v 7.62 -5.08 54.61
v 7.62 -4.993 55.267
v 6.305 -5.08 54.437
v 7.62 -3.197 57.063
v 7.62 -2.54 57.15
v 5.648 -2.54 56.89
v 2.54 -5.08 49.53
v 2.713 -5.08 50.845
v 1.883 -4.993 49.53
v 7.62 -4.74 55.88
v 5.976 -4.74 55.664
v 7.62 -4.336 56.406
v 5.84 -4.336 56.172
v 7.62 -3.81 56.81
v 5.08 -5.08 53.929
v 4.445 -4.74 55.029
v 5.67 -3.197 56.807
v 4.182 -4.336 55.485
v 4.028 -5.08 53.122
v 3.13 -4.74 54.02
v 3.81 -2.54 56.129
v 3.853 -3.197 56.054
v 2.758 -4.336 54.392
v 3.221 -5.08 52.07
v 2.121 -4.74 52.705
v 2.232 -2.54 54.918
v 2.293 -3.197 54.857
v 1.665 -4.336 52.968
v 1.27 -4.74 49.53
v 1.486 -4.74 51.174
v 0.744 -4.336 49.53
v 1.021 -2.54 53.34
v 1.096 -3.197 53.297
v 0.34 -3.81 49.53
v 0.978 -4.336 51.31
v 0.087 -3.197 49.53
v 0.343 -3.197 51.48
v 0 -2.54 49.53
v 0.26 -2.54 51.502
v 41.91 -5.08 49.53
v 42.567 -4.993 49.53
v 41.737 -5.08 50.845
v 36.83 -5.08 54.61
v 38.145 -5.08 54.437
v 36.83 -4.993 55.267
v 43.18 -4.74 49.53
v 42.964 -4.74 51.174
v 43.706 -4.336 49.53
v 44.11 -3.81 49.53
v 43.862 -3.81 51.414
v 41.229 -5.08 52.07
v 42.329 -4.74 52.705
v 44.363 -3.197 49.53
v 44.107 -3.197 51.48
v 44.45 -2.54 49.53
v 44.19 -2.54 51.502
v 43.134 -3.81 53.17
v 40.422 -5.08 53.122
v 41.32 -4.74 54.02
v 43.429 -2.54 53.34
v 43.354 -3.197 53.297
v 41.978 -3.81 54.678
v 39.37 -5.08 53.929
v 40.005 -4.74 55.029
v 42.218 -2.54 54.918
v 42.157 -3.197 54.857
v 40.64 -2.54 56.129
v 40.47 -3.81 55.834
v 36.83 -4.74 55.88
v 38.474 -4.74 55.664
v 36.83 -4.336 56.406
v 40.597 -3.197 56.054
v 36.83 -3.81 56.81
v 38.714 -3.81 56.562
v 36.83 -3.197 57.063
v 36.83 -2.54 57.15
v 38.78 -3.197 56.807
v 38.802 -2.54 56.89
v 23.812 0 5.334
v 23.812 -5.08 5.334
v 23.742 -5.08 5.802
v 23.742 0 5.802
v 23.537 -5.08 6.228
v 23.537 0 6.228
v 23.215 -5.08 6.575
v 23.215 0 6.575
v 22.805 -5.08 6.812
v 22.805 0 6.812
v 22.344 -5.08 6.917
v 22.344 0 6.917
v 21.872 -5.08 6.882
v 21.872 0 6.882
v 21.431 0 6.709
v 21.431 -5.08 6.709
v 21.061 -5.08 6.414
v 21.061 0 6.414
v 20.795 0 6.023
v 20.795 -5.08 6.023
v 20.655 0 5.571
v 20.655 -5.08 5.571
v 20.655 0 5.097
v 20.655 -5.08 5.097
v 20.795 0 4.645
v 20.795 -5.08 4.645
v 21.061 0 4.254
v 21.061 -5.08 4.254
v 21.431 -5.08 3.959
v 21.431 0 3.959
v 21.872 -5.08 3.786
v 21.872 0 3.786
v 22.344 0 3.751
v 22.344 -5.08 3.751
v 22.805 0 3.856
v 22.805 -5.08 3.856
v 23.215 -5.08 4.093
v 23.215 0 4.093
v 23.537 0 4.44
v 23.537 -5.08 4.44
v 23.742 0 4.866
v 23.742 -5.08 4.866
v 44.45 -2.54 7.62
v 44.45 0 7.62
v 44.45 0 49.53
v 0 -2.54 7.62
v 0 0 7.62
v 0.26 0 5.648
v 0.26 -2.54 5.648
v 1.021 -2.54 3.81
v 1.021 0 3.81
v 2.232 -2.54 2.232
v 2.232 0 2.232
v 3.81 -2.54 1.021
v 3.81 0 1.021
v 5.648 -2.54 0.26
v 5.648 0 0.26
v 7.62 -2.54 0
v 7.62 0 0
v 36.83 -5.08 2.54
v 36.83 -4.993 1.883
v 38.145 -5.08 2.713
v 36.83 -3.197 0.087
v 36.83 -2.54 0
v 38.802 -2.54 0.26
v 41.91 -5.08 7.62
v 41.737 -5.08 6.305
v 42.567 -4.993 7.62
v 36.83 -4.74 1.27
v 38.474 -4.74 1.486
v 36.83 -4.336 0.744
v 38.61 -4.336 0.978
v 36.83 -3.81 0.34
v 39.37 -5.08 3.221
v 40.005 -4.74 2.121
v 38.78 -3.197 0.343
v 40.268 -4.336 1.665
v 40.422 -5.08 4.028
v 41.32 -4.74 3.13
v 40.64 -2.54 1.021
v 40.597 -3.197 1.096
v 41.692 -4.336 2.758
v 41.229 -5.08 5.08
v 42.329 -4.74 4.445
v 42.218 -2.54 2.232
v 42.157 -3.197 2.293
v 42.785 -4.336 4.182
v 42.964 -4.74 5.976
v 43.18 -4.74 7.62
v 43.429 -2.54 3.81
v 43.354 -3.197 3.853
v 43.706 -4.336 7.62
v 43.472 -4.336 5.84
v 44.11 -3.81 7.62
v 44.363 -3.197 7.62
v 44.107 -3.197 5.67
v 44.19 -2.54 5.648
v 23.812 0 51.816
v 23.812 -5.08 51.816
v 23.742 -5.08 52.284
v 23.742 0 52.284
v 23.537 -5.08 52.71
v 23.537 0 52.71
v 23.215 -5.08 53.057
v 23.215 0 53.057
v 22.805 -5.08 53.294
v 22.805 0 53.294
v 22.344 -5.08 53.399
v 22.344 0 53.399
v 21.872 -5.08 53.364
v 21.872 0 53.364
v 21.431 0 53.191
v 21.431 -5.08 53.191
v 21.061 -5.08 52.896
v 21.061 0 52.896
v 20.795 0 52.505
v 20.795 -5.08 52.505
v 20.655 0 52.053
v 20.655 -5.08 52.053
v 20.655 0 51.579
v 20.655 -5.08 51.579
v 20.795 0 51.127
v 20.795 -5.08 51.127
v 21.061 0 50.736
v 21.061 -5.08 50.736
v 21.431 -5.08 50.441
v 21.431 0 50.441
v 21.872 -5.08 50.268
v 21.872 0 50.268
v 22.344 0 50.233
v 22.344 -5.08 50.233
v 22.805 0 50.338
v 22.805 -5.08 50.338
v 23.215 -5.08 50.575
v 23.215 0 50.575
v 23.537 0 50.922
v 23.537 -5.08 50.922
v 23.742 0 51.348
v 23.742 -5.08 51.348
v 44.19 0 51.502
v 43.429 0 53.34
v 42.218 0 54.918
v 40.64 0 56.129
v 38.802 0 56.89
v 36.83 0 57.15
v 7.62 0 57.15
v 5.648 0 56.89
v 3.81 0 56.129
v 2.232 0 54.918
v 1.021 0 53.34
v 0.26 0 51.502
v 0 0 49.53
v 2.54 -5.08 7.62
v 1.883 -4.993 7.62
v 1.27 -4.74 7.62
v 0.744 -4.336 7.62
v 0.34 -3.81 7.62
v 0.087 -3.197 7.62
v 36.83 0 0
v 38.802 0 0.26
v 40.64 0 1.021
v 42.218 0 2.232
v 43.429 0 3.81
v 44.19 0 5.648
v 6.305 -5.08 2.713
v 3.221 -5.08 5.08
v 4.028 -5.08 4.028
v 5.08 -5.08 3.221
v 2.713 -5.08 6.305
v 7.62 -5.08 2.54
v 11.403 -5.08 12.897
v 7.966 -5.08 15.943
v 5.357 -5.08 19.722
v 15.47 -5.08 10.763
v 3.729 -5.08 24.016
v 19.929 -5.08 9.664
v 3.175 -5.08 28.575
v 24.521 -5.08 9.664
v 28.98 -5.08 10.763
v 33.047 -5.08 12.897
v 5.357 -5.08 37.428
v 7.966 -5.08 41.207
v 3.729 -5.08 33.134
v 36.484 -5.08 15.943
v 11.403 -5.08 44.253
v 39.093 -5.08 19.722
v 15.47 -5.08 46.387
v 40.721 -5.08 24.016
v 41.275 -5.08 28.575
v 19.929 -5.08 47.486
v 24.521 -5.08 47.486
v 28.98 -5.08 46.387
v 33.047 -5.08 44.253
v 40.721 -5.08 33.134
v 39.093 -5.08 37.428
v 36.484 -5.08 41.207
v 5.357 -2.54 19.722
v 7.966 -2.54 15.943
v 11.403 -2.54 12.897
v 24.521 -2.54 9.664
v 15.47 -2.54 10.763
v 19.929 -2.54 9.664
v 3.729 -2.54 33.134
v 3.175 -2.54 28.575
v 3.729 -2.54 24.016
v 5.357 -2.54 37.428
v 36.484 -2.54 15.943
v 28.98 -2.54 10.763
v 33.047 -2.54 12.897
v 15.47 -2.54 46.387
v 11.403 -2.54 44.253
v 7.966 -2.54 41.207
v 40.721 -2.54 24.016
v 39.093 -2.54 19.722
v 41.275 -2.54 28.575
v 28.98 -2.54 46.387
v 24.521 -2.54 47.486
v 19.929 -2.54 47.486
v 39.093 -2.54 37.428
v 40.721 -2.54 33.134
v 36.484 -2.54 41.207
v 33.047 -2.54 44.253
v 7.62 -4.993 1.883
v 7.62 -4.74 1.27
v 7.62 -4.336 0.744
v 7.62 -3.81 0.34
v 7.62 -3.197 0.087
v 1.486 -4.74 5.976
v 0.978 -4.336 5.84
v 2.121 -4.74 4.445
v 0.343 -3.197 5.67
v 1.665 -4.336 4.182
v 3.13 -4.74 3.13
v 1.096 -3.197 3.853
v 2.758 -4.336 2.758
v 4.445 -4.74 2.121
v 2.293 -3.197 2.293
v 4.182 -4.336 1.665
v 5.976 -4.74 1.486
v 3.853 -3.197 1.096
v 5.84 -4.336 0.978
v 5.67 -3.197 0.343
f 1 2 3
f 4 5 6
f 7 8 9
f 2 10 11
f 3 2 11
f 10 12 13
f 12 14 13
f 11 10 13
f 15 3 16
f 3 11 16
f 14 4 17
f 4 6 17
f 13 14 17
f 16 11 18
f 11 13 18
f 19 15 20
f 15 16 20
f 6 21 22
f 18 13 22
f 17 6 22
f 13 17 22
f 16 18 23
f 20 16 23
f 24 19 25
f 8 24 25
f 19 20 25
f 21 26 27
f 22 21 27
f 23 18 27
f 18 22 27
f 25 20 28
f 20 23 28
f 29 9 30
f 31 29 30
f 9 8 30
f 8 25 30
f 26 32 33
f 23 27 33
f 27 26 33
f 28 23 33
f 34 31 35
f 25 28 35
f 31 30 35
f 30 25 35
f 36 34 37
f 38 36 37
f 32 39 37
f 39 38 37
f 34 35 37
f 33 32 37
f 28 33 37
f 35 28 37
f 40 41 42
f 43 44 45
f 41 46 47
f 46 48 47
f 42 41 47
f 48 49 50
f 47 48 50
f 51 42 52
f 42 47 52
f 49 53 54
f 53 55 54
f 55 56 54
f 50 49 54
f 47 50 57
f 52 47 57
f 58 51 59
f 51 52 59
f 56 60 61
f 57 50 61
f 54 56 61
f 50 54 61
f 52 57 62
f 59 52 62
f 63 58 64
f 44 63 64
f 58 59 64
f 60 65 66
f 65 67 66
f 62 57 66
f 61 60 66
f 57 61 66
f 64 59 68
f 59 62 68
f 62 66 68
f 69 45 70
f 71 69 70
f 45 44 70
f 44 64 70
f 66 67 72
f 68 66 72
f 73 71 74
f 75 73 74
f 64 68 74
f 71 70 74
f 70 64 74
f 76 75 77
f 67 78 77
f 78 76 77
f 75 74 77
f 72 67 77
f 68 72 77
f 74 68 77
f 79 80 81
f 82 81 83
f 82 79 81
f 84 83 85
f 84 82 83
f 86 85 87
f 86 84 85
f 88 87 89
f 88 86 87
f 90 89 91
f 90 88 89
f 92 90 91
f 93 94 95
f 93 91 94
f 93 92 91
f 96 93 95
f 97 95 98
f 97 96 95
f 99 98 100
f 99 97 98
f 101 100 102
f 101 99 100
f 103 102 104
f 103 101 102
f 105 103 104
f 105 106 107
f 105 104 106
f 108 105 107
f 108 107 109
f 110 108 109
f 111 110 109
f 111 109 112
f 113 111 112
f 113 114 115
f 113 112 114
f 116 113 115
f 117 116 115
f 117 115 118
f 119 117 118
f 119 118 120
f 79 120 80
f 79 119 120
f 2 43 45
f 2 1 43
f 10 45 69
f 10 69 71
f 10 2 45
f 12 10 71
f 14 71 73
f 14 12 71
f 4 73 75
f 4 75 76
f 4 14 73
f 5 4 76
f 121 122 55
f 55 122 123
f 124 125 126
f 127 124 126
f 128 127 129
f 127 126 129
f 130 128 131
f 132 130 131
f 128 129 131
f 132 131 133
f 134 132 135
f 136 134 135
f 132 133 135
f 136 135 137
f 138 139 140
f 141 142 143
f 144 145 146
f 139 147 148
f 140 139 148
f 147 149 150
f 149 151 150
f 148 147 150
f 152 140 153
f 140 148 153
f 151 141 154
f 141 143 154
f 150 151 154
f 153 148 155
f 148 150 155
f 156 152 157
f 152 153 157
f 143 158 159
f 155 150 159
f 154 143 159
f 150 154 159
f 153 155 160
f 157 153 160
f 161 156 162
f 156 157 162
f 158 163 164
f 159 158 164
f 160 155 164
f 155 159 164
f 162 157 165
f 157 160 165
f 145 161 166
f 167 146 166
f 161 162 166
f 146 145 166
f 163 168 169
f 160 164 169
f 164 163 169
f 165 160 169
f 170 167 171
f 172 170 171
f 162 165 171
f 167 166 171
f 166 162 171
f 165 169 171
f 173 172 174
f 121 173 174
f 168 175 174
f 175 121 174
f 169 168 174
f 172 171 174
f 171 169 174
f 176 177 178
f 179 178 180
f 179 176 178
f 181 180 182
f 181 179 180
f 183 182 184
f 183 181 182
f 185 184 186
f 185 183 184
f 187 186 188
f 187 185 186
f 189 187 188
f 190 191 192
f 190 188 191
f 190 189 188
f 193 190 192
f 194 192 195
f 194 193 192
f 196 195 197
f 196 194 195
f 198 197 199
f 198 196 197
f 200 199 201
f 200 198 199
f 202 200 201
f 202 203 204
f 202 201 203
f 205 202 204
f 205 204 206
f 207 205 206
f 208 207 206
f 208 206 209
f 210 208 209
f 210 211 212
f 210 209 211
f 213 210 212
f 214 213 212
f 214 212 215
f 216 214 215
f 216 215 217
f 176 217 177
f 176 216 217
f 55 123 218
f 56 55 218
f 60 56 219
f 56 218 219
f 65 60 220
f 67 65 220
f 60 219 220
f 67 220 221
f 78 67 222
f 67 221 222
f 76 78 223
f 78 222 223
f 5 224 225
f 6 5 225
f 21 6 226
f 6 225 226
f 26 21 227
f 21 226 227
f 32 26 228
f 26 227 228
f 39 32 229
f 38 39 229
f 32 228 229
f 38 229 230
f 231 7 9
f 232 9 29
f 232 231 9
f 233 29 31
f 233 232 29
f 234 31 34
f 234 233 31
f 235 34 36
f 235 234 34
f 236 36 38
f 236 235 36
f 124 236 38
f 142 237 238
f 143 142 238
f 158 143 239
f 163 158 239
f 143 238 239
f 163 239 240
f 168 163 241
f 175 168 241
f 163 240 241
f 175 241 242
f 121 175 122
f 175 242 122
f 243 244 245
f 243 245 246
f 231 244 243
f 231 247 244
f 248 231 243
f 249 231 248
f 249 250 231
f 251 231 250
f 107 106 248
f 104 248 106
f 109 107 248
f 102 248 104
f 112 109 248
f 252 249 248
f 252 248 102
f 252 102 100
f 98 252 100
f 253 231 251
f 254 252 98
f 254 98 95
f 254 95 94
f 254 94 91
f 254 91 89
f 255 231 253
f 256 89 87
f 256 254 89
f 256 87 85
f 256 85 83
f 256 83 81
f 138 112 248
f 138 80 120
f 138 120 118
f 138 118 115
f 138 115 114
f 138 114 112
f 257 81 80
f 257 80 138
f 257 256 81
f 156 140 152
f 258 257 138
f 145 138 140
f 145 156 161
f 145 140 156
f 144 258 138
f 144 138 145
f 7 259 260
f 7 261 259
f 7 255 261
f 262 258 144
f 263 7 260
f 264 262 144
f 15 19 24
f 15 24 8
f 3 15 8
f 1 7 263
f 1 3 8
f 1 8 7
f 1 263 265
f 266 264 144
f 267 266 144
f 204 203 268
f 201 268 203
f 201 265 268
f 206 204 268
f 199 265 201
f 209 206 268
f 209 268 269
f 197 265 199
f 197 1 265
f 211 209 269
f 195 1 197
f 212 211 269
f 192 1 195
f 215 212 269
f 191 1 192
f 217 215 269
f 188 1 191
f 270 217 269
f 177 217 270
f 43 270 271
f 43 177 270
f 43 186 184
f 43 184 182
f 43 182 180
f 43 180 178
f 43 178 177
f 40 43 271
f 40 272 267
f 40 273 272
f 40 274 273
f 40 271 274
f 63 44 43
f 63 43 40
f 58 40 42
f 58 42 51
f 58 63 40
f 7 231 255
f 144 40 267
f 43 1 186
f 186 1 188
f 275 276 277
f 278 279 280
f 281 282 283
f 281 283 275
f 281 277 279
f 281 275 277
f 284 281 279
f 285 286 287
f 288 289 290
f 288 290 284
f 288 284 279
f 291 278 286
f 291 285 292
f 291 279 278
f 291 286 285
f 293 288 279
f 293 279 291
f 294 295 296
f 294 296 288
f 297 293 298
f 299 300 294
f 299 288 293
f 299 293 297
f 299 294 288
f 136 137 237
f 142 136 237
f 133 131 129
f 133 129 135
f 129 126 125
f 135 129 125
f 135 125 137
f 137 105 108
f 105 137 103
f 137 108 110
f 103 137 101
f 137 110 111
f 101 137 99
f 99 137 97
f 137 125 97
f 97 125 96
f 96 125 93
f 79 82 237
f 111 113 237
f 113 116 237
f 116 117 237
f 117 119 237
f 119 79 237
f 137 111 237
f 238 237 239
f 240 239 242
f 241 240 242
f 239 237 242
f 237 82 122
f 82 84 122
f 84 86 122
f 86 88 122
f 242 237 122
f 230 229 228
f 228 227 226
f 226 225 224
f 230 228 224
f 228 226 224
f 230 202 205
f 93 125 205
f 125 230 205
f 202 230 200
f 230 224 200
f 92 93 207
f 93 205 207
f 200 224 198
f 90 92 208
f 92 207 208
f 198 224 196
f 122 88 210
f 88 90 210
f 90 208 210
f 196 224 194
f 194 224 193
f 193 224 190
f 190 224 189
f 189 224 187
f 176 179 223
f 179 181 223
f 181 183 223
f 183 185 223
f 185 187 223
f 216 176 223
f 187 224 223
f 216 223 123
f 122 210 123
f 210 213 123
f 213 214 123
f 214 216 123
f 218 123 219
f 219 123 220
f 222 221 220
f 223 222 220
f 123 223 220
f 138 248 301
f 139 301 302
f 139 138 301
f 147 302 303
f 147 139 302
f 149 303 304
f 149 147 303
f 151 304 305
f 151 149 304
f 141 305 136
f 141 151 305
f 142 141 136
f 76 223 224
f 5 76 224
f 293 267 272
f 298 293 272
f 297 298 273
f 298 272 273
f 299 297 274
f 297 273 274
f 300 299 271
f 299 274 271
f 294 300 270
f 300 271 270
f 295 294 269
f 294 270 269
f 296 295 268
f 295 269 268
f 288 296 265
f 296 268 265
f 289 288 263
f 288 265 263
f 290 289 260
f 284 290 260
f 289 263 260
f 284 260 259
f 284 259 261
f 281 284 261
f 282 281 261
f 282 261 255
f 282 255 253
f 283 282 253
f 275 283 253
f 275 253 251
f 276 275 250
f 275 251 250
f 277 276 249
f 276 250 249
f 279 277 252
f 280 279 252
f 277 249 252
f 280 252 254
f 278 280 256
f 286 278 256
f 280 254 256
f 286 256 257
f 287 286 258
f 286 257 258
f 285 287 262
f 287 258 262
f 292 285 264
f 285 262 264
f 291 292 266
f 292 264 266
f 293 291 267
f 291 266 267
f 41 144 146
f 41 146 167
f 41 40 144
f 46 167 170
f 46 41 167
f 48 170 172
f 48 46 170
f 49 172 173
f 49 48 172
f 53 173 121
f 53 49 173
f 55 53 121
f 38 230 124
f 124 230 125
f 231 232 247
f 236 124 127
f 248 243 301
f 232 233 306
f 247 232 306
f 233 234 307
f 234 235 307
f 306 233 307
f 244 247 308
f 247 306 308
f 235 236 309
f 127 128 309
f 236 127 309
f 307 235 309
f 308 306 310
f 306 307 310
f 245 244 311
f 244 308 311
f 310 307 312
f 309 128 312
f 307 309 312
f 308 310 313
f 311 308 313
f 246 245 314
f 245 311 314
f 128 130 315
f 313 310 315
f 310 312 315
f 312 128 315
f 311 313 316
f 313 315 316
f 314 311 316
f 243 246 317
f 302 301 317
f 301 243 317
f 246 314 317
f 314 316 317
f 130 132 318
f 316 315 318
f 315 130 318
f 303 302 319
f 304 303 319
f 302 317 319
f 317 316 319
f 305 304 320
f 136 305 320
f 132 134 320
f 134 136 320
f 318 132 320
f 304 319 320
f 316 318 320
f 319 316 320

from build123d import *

# Parameters (mm, degrees)
F1_DEPTH = 5.08
F2_R     = 1.5875
F3_DEPTH = 25.4
F4_R     = 2.54
F5_R     = 19.05
F6_DEPTH = 2.54


with BuildPart() as f1:
    # F0 (on Front) → F1 (new body)
    with BuildSketch(Plane.XZ):
        with BuildLine():
            ThreePointArc((0, 7.62), (2.231846, 2.231846), (7.62, 0))
            Line((7.62, 0), (36.83, 0))
            ThreePointArc((36.83, 0), (42.218154, 2.231846), (44.45, 7.62))
            Line((44.45, 7.62), (44.45, 49.53))
            ThreePointArc((44.45, 49.53), (42.218154, 54.918154), (36.83, 57.15))
            Line((36.83, 57.15), (7.62, 57.15))
            ThreePointArc((7.62, 57.15), (2.231846, 54.918154), (0, 49.53))
            Line((0, 49.53), (0, 7.62))
        make_face()
    extrude(amount=F1_DEPTH)

    # F2 (on Front) → F3 (cut)
    with BuildSketch(Plane.XZ):
        with Locations((22.225, 51.816)):
            Circle(F2_R)
        with Locations((22.225, 5.334)):
            Circle(F2_R)
    extrude(amount=F3_DEPTH, mode=Mode.SUBTRACT)

    # F4
    f4_edges = [f1.edges().sort_by_distance(p)[0] for p in [
        (22.225, -5.08, 57.15),
    ]]
    fillet(f4_edges, radius=F4_R)

    # F5 (on face) → F6 (cut)
    with BuildSketch(Plane.XZ.offset(5.08)):
        with Locations((22.225, 28.575)):
            Circle(F5_R)
    extrude(amount=-F6_DEPTH, mode=Mode.SUBTRACT)


solid = f1.part
